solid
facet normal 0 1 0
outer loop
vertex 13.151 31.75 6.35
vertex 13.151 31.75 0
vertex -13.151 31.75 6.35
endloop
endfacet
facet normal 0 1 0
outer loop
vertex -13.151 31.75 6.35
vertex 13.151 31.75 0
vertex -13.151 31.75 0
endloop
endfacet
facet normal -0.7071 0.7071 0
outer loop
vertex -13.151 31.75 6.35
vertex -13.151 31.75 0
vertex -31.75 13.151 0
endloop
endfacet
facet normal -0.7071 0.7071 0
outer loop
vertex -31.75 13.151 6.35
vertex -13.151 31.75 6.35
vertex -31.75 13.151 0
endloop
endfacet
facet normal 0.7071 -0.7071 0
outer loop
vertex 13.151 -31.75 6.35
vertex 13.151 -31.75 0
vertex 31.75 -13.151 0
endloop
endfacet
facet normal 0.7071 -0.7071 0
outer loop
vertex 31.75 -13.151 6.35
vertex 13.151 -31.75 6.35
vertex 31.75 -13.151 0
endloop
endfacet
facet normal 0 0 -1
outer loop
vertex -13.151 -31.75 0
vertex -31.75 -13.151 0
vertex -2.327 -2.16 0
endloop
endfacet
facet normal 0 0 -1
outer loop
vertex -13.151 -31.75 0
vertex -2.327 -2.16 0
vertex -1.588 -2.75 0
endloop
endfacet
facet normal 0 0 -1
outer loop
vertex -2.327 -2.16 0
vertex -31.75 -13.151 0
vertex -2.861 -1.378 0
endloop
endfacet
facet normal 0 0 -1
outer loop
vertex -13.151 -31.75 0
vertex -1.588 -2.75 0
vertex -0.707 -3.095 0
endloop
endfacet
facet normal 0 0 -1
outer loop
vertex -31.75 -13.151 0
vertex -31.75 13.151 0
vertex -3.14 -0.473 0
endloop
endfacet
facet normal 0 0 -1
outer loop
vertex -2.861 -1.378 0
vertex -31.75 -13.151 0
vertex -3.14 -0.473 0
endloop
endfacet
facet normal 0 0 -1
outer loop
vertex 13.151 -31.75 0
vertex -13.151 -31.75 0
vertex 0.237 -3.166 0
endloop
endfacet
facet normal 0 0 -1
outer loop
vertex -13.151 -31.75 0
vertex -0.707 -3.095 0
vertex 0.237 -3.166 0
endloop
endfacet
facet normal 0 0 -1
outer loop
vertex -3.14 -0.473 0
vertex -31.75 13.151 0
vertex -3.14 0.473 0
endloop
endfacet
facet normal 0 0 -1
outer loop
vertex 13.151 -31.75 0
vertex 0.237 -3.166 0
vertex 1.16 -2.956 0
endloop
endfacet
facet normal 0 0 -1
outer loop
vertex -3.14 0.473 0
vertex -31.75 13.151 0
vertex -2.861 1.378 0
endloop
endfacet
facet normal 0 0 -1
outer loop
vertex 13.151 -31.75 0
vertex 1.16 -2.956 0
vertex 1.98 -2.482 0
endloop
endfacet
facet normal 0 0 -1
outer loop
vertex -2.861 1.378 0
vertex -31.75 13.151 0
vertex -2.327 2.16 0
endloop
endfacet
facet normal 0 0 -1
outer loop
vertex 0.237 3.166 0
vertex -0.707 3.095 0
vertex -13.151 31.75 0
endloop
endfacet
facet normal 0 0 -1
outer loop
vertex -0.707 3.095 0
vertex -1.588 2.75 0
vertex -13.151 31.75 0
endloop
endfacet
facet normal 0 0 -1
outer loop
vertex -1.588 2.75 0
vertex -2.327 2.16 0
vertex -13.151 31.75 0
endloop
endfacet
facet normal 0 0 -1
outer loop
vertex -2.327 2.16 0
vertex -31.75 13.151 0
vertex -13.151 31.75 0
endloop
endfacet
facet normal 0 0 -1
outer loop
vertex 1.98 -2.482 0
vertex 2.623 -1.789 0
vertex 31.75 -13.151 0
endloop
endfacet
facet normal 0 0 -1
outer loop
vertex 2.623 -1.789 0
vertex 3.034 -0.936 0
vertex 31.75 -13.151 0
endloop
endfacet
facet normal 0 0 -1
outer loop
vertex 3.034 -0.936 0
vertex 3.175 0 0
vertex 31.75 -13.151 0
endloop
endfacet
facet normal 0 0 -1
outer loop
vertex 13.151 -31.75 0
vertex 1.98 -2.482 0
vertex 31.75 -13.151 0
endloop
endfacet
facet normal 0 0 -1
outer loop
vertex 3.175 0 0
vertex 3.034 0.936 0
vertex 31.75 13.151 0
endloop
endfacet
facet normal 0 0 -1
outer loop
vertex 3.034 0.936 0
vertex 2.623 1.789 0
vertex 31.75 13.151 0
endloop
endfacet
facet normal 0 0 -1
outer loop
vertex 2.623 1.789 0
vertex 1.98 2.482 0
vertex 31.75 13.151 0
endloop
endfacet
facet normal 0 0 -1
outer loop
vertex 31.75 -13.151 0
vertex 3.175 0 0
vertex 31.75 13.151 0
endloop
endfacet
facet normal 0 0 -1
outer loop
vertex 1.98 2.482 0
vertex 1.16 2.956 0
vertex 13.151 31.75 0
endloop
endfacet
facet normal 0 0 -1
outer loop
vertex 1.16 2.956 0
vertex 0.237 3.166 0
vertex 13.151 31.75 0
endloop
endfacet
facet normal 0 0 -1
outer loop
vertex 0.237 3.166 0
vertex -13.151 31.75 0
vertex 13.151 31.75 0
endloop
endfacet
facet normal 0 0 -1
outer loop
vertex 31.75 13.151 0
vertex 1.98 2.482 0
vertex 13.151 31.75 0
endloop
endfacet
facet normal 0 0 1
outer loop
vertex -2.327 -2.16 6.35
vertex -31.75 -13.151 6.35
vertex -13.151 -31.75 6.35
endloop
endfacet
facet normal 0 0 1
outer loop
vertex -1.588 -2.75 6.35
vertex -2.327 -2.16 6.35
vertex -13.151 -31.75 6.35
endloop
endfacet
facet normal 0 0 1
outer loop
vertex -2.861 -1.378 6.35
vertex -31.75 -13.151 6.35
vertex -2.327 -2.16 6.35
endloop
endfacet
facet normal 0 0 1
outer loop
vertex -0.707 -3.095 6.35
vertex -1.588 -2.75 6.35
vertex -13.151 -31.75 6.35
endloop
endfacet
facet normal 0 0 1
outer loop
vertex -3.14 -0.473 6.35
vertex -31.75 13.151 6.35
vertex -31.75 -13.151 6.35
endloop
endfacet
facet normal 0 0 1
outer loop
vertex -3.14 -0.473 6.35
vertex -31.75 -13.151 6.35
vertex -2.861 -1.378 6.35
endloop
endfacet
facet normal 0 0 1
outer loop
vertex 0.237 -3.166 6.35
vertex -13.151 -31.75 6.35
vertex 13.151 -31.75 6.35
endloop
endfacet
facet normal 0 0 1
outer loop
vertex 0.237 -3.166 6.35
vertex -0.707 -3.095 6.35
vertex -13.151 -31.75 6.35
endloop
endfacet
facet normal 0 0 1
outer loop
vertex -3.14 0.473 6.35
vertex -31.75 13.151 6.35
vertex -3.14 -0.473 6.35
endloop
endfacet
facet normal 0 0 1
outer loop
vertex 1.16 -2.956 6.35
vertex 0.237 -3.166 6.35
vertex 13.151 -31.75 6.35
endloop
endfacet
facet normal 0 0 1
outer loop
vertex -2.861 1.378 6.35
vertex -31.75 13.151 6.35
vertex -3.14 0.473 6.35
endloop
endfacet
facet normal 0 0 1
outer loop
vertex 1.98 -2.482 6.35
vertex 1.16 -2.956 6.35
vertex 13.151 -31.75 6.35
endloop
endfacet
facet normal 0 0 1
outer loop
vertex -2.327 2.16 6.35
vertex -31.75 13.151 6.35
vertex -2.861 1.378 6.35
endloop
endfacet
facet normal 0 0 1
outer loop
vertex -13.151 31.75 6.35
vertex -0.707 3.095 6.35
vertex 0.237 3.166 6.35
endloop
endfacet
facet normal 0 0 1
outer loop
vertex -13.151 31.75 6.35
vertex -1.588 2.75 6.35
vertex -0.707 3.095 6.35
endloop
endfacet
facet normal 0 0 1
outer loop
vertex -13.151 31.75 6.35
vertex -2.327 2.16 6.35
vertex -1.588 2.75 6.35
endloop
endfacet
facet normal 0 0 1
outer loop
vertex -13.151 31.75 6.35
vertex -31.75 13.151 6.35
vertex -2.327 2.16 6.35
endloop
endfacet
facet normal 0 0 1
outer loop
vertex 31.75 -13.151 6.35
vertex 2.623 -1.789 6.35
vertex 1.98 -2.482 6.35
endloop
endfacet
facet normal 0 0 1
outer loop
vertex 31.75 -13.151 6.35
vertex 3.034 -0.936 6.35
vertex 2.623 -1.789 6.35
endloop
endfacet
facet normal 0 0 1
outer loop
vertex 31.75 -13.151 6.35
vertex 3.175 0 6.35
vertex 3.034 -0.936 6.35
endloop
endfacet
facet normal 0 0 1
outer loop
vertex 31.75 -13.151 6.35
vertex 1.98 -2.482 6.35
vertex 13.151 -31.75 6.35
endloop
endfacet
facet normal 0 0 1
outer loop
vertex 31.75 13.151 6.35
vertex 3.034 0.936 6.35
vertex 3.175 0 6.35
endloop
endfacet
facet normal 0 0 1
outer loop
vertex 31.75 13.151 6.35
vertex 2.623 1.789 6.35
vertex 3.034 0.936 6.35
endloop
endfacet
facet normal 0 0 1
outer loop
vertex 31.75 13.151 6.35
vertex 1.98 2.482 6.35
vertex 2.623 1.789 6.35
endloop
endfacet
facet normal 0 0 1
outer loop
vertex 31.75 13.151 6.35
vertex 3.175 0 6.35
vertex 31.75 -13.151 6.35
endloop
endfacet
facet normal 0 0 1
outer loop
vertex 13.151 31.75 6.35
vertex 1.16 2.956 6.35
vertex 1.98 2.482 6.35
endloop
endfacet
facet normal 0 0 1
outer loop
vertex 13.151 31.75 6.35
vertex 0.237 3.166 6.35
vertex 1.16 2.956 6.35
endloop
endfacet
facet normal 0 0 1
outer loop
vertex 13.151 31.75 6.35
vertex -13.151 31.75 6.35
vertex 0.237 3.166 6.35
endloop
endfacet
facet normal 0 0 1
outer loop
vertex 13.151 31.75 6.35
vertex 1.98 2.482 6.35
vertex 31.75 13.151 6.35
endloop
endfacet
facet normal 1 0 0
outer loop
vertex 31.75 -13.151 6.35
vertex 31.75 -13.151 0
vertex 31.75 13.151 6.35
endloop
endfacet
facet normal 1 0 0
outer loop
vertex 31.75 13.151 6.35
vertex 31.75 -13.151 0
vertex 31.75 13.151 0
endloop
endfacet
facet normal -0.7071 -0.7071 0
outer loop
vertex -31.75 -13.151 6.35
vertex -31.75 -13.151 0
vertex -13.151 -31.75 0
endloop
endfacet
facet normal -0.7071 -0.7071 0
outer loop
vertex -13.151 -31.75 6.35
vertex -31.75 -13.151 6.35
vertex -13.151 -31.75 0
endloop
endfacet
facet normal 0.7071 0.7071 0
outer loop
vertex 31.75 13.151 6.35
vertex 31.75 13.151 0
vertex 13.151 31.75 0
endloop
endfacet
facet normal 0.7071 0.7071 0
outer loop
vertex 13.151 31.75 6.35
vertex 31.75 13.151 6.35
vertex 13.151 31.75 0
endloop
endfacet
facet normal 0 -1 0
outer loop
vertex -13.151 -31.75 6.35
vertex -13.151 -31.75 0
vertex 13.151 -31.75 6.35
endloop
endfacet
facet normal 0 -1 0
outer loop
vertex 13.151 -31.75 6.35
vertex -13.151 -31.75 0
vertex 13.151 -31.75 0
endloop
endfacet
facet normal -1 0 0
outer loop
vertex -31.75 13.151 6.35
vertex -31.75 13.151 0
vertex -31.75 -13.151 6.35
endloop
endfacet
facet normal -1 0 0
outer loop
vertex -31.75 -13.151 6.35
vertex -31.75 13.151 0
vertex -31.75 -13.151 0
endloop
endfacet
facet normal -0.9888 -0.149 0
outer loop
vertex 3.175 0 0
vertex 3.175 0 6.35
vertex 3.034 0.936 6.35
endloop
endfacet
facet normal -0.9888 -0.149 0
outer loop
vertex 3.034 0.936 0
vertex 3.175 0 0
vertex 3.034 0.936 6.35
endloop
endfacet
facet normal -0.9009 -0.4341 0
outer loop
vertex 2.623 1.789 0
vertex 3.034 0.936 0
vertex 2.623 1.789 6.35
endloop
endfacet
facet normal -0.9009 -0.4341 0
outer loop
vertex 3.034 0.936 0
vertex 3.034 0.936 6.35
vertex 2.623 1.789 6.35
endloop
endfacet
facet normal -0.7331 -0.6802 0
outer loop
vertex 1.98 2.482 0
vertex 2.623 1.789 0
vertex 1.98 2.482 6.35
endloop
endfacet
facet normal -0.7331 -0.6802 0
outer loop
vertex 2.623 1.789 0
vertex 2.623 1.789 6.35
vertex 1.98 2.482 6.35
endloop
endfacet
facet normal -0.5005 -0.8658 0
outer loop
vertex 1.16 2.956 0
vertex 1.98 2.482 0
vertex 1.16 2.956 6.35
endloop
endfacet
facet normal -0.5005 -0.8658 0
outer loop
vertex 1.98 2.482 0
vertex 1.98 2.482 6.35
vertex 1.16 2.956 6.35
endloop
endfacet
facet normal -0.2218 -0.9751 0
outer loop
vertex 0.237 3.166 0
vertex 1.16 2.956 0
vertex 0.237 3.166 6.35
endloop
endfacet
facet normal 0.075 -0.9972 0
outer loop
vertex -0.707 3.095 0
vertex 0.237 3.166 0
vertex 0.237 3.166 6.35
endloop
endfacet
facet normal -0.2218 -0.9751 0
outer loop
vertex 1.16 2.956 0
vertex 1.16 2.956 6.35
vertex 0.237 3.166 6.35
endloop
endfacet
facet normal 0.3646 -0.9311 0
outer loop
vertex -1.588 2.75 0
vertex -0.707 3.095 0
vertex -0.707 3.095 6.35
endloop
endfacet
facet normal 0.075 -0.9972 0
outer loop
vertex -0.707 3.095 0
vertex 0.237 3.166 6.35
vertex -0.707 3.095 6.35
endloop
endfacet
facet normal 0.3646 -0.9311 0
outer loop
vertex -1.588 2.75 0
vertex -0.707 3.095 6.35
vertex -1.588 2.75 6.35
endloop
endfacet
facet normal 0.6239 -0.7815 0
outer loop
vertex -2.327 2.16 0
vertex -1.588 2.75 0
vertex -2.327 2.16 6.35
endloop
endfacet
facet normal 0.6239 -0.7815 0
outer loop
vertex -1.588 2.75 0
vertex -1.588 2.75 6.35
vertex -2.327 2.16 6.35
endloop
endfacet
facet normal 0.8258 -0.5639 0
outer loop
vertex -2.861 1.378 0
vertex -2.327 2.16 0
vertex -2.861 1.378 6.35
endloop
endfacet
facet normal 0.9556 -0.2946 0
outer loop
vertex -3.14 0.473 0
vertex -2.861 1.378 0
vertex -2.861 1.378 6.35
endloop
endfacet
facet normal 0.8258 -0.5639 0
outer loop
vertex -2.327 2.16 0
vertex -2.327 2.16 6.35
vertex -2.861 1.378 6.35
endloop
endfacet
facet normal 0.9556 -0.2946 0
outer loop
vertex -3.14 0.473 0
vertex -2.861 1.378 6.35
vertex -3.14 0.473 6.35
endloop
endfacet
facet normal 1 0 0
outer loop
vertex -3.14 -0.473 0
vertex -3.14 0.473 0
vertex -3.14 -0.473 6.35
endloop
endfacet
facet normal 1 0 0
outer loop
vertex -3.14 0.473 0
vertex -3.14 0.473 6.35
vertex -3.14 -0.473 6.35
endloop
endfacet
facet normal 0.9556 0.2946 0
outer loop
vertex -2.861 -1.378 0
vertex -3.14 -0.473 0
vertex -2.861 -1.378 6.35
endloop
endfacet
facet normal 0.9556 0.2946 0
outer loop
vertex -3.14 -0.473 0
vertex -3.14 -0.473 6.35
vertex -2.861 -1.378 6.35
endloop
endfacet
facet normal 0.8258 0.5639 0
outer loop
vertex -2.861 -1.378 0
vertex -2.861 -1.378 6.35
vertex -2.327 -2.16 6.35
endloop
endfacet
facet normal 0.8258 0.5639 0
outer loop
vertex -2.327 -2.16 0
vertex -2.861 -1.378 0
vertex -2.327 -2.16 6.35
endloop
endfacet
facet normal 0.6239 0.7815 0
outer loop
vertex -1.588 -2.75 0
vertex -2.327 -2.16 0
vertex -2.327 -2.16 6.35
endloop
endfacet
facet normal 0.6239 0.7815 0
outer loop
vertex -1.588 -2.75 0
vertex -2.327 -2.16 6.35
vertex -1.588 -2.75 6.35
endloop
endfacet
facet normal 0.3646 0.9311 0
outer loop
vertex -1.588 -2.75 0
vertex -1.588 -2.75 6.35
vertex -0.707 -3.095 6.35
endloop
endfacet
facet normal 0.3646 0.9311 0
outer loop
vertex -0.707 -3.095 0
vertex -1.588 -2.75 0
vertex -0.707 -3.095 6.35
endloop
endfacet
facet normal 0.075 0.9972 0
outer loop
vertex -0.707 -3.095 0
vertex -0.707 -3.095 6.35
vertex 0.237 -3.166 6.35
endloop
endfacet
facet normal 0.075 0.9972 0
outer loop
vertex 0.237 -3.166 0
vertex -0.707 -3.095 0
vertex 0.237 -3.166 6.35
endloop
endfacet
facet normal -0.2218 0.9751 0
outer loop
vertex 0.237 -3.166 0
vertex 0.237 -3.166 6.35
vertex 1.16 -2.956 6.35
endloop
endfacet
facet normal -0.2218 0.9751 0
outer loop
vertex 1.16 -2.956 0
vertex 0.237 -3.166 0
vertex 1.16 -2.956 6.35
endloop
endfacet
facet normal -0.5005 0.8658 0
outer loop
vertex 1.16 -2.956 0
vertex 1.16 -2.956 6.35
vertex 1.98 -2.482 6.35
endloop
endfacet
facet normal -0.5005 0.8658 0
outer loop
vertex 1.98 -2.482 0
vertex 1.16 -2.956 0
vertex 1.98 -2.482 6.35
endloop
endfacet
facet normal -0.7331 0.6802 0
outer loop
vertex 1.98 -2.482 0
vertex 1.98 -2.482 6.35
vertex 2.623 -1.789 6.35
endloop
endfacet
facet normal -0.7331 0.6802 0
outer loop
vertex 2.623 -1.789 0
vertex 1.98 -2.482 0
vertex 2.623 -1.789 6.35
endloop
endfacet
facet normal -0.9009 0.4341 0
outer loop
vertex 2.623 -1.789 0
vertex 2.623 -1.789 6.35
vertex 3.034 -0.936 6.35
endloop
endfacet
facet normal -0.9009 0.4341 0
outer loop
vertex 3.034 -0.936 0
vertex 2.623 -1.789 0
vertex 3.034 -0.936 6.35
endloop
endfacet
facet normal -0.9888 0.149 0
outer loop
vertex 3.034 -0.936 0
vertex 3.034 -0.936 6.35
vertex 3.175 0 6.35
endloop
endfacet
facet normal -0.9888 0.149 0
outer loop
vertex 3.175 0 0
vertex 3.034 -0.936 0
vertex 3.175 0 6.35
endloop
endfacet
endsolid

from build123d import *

# Parameters (mm, degrees)
F1_DEPTH = 6.35
F2_R     = 3.175
F3_DEPTH = 25.4


with BuildPart() as f1:
    # F0 (on Top) → F1 (new body)
    with BuildSketch(Plane.XY):
        Polygon((-31.75, 13.1512806053), (-31.75, -13.1512806053), (-13.1512806053, -31.75), (13.1512806053, -31.75), (31.75, -13.1512806053), (31.75, 13.1512806053), (13.1512806053, 31.75), (-13.1512806053, 31.75), align=None)
    extrude(amount=F1_DEPTH)

    # F2 (on face) → F3 (cut)
    with BuildSketch(Plane.XY.offset(6.35)):
        Circle(F2_R)
    extrude(amount=-F3_DEPTH, mode=Mode.SUBTRACT)


solid = f1.part
